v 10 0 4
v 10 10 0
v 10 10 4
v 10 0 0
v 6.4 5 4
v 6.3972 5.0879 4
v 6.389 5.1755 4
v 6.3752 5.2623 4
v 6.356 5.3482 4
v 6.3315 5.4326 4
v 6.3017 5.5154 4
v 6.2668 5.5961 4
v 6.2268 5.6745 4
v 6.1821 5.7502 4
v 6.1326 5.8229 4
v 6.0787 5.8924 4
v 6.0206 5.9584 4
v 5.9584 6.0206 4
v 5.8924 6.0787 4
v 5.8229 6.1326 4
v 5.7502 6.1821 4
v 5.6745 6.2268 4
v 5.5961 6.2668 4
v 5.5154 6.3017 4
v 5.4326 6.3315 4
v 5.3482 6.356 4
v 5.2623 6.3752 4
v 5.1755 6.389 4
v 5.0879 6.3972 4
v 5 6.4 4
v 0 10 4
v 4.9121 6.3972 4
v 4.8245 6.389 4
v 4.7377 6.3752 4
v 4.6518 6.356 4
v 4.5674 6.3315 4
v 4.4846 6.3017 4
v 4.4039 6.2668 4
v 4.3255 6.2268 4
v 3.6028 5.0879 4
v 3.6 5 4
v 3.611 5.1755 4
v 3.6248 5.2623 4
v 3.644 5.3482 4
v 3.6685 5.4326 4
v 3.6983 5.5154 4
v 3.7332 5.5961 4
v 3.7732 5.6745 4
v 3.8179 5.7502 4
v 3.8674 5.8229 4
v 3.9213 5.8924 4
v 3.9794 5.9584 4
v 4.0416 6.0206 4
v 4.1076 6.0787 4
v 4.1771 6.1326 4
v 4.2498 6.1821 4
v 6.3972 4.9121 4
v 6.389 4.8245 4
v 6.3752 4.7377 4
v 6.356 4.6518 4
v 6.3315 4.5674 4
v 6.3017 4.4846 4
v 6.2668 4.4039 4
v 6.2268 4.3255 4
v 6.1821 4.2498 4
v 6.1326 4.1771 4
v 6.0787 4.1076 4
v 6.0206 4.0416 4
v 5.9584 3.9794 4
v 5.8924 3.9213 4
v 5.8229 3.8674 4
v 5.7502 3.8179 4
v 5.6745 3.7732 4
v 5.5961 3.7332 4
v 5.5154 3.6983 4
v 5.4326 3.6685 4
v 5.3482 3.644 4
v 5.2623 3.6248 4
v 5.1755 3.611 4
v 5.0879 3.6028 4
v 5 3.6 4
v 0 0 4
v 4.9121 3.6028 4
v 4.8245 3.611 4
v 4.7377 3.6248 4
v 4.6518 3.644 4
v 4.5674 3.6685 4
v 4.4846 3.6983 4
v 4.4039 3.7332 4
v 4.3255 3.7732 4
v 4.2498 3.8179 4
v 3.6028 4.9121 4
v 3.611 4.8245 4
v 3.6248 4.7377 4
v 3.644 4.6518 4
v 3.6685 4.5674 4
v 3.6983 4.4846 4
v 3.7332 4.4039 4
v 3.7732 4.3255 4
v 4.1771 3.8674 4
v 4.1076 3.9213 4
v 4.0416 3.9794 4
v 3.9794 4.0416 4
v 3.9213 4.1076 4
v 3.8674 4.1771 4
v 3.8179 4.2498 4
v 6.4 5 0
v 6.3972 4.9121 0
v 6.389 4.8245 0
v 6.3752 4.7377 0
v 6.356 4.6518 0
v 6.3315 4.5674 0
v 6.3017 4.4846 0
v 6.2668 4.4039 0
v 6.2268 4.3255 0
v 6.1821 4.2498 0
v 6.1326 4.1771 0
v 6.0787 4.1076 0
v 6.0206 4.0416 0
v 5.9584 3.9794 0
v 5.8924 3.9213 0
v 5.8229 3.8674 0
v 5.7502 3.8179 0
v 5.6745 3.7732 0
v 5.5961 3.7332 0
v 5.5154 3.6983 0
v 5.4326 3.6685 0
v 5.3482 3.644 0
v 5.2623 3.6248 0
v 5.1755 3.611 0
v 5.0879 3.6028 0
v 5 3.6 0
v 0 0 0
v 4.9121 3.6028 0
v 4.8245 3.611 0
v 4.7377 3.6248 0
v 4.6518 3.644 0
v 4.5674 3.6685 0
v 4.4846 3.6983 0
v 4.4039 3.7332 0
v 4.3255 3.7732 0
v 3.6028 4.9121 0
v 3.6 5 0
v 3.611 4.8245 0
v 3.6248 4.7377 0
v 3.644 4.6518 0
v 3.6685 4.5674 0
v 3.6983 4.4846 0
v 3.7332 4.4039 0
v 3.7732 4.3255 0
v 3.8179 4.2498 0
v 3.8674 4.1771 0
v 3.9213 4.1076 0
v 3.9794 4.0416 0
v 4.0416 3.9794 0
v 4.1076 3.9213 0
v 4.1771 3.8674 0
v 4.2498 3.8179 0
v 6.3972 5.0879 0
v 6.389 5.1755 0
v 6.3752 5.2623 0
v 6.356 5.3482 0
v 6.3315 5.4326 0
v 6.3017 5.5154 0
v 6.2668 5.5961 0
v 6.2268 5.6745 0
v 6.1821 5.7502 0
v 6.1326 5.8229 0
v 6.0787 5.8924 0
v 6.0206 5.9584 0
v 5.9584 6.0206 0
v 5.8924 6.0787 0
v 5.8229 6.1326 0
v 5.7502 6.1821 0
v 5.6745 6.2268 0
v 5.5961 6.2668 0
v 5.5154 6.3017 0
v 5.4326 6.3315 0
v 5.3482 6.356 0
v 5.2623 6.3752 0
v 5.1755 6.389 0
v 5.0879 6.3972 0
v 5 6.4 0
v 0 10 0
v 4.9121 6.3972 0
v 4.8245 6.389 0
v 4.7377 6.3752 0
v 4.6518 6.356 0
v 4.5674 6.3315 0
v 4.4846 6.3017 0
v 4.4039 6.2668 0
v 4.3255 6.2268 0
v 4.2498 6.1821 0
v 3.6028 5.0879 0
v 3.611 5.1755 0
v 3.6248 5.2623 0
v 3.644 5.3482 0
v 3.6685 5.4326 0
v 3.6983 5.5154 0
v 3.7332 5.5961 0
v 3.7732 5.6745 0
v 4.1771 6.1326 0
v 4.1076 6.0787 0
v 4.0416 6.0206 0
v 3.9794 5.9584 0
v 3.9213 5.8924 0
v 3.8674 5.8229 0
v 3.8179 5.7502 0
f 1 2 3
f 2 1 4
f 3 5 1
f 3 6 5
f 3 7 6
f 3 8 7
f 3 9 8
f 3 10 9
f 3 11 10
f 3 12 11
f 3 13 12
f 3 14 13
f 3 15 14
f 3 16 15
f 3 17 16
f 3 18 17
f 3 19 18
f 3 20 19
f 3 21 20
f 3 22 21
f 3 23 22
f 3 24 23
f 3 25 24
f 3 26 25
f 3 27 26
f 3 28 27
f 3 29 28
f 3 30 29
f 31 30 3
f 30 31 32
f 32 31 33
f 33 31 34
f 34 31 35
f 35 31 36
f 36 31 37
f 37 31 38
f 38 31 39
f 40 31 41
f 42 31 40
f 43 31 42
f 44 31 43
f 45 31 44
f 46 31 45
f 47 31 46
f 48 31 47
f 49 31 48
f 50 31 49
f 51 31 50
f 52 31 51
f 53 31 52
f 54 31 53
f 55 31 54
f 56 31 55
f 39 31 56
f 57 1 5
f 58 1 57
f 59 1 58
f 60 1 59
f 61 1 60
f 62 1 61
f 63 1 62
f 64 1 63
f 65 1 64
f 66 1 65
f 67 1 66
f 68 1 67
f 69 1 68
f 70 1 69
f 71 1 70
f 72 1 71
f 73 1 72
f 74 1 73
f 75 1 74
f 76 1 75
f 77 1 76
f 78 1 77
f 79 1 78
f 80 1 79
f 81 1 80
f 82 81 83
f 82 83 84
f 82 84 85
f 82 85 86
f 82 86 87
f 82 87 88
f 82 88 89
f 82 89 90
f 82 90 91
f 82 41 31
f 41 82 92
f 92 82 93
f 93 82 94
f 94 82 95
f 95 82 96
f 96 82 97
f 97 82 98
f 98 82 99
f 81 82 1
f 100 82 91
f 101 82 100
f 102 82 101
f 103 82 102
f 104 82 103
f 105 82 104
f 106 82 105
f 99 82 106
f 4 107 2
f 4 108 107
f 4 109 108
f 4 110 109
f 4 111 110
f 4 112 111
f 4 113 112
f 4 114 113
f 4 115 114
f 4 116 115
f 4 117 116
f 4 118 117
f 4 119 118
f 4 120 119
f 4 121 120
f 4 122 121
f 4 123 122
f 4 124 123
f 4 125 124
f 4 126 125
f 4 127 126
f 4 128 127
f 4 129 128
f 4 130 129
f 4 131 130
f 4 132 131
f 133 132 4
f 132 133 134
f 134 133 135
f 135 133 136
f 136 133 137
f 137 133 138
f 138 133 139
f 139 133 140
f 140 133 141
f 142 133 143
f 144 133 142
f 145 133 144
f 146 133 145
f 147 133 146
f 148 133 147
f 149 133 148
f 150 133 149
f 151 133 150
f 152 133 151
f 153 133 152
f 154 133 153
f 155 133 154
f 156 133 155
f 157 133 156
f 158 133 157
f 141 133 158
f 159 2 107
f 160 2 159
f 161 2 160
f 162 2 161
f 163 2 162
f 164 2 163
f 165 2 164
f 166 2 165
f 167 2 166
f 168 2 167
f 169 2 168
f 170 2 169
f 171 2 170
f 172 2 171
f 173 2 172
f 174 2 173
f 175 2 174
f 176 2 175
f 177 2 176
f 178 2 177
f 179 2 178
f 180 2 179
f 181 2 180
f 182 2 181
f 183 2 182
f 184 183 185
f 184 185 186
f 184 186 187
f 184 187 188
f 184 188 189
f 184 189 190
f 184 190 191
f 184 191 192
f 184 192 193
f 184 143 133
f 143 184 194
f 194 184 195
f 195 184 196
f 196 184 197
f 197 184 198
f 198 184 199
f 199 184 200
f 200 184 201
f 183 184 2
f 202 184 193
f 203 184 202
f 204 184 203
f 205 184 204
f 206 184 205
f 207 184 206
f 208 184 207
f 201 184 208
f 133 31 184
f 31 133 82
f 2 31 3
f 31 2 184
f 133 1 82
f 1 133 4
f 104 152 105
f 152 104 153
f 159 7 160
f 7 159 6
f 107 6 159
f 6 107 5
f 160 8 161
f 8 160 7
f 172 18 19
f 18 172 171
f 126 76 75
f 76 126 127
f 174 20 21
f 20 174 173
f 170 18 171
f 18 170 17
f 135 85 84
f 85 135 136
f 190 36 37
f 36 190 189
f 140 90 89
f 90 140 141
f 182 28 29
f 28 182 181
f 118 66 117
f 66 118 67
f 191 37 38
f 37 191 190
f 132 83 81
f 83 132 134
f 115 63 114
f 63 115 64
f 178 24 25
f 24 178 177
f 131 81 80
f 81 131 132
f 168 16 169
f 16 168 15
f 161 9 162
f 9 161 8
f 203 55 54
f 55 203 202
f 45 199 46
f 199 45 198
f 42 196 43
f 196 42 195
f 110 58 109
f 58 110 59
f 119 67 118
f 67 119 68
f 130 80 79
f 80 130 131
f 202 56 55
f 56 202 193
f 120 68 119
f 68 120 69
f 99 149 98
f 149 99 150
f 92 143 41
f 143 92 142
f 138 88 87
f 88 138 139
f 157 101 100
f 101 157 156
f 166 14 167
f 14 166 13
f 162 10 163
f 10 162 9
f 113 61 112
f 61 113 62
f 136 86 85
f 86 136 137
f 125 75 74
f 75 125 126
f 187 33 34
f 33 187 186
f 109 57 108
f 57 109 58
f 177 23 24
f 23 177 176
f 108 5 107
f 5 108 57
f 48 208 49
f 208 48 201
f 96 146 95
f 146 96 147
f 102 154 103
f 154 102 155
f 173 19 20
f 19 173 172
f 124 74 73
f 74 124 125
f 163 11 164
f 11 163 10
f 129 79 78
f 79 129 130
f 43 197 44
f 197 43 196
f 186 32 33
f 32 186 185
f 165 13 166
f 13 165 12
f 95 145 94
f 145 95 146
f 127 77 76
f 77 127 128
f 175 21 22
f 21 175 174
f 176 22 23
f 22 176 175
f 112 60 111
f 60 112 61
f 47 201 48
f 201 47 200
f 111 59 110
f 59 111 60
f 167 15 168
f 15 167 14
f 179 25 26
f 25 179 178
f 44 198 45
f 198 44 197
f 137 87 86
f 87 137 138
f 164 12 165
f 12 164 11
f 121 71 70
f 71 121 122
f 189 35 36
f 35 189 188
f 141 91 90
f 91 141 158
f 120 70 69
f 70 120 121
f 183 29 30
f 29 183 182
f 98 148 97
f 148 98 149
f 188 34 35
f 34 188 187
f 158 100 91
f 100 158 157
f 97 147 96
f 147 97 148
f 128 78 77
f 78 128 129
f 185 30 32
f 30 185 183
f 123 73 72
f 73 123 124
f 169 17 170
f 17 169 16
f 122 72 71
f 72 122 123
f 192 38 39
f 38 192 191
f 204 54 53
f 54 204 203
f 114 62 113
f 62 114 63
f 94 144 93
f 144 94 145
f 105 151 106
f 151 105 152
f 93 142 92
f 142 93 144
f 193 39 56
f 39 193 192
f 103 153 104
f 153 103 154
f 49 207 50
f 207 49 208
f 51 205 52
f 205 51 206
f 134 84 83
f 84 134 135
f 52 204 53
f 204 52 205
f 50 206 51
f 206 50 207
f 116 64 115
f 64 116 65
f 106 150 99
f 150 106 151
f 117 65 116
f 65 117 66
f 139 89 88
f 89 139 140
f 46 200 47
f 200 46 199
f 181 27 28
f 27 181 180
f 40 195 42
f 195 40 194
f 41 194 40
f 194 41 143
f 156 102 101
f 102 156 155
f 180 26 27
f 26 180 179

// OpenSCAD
module screw_hole(h = 10, d = 3) {
  cylinder(h=h, d=d, center=false, $fn=100);
}

difference() {
  cube([10, 10, 4], false);
  translate([5, 5, -1])
    screw_hole(d=2.8);
}
